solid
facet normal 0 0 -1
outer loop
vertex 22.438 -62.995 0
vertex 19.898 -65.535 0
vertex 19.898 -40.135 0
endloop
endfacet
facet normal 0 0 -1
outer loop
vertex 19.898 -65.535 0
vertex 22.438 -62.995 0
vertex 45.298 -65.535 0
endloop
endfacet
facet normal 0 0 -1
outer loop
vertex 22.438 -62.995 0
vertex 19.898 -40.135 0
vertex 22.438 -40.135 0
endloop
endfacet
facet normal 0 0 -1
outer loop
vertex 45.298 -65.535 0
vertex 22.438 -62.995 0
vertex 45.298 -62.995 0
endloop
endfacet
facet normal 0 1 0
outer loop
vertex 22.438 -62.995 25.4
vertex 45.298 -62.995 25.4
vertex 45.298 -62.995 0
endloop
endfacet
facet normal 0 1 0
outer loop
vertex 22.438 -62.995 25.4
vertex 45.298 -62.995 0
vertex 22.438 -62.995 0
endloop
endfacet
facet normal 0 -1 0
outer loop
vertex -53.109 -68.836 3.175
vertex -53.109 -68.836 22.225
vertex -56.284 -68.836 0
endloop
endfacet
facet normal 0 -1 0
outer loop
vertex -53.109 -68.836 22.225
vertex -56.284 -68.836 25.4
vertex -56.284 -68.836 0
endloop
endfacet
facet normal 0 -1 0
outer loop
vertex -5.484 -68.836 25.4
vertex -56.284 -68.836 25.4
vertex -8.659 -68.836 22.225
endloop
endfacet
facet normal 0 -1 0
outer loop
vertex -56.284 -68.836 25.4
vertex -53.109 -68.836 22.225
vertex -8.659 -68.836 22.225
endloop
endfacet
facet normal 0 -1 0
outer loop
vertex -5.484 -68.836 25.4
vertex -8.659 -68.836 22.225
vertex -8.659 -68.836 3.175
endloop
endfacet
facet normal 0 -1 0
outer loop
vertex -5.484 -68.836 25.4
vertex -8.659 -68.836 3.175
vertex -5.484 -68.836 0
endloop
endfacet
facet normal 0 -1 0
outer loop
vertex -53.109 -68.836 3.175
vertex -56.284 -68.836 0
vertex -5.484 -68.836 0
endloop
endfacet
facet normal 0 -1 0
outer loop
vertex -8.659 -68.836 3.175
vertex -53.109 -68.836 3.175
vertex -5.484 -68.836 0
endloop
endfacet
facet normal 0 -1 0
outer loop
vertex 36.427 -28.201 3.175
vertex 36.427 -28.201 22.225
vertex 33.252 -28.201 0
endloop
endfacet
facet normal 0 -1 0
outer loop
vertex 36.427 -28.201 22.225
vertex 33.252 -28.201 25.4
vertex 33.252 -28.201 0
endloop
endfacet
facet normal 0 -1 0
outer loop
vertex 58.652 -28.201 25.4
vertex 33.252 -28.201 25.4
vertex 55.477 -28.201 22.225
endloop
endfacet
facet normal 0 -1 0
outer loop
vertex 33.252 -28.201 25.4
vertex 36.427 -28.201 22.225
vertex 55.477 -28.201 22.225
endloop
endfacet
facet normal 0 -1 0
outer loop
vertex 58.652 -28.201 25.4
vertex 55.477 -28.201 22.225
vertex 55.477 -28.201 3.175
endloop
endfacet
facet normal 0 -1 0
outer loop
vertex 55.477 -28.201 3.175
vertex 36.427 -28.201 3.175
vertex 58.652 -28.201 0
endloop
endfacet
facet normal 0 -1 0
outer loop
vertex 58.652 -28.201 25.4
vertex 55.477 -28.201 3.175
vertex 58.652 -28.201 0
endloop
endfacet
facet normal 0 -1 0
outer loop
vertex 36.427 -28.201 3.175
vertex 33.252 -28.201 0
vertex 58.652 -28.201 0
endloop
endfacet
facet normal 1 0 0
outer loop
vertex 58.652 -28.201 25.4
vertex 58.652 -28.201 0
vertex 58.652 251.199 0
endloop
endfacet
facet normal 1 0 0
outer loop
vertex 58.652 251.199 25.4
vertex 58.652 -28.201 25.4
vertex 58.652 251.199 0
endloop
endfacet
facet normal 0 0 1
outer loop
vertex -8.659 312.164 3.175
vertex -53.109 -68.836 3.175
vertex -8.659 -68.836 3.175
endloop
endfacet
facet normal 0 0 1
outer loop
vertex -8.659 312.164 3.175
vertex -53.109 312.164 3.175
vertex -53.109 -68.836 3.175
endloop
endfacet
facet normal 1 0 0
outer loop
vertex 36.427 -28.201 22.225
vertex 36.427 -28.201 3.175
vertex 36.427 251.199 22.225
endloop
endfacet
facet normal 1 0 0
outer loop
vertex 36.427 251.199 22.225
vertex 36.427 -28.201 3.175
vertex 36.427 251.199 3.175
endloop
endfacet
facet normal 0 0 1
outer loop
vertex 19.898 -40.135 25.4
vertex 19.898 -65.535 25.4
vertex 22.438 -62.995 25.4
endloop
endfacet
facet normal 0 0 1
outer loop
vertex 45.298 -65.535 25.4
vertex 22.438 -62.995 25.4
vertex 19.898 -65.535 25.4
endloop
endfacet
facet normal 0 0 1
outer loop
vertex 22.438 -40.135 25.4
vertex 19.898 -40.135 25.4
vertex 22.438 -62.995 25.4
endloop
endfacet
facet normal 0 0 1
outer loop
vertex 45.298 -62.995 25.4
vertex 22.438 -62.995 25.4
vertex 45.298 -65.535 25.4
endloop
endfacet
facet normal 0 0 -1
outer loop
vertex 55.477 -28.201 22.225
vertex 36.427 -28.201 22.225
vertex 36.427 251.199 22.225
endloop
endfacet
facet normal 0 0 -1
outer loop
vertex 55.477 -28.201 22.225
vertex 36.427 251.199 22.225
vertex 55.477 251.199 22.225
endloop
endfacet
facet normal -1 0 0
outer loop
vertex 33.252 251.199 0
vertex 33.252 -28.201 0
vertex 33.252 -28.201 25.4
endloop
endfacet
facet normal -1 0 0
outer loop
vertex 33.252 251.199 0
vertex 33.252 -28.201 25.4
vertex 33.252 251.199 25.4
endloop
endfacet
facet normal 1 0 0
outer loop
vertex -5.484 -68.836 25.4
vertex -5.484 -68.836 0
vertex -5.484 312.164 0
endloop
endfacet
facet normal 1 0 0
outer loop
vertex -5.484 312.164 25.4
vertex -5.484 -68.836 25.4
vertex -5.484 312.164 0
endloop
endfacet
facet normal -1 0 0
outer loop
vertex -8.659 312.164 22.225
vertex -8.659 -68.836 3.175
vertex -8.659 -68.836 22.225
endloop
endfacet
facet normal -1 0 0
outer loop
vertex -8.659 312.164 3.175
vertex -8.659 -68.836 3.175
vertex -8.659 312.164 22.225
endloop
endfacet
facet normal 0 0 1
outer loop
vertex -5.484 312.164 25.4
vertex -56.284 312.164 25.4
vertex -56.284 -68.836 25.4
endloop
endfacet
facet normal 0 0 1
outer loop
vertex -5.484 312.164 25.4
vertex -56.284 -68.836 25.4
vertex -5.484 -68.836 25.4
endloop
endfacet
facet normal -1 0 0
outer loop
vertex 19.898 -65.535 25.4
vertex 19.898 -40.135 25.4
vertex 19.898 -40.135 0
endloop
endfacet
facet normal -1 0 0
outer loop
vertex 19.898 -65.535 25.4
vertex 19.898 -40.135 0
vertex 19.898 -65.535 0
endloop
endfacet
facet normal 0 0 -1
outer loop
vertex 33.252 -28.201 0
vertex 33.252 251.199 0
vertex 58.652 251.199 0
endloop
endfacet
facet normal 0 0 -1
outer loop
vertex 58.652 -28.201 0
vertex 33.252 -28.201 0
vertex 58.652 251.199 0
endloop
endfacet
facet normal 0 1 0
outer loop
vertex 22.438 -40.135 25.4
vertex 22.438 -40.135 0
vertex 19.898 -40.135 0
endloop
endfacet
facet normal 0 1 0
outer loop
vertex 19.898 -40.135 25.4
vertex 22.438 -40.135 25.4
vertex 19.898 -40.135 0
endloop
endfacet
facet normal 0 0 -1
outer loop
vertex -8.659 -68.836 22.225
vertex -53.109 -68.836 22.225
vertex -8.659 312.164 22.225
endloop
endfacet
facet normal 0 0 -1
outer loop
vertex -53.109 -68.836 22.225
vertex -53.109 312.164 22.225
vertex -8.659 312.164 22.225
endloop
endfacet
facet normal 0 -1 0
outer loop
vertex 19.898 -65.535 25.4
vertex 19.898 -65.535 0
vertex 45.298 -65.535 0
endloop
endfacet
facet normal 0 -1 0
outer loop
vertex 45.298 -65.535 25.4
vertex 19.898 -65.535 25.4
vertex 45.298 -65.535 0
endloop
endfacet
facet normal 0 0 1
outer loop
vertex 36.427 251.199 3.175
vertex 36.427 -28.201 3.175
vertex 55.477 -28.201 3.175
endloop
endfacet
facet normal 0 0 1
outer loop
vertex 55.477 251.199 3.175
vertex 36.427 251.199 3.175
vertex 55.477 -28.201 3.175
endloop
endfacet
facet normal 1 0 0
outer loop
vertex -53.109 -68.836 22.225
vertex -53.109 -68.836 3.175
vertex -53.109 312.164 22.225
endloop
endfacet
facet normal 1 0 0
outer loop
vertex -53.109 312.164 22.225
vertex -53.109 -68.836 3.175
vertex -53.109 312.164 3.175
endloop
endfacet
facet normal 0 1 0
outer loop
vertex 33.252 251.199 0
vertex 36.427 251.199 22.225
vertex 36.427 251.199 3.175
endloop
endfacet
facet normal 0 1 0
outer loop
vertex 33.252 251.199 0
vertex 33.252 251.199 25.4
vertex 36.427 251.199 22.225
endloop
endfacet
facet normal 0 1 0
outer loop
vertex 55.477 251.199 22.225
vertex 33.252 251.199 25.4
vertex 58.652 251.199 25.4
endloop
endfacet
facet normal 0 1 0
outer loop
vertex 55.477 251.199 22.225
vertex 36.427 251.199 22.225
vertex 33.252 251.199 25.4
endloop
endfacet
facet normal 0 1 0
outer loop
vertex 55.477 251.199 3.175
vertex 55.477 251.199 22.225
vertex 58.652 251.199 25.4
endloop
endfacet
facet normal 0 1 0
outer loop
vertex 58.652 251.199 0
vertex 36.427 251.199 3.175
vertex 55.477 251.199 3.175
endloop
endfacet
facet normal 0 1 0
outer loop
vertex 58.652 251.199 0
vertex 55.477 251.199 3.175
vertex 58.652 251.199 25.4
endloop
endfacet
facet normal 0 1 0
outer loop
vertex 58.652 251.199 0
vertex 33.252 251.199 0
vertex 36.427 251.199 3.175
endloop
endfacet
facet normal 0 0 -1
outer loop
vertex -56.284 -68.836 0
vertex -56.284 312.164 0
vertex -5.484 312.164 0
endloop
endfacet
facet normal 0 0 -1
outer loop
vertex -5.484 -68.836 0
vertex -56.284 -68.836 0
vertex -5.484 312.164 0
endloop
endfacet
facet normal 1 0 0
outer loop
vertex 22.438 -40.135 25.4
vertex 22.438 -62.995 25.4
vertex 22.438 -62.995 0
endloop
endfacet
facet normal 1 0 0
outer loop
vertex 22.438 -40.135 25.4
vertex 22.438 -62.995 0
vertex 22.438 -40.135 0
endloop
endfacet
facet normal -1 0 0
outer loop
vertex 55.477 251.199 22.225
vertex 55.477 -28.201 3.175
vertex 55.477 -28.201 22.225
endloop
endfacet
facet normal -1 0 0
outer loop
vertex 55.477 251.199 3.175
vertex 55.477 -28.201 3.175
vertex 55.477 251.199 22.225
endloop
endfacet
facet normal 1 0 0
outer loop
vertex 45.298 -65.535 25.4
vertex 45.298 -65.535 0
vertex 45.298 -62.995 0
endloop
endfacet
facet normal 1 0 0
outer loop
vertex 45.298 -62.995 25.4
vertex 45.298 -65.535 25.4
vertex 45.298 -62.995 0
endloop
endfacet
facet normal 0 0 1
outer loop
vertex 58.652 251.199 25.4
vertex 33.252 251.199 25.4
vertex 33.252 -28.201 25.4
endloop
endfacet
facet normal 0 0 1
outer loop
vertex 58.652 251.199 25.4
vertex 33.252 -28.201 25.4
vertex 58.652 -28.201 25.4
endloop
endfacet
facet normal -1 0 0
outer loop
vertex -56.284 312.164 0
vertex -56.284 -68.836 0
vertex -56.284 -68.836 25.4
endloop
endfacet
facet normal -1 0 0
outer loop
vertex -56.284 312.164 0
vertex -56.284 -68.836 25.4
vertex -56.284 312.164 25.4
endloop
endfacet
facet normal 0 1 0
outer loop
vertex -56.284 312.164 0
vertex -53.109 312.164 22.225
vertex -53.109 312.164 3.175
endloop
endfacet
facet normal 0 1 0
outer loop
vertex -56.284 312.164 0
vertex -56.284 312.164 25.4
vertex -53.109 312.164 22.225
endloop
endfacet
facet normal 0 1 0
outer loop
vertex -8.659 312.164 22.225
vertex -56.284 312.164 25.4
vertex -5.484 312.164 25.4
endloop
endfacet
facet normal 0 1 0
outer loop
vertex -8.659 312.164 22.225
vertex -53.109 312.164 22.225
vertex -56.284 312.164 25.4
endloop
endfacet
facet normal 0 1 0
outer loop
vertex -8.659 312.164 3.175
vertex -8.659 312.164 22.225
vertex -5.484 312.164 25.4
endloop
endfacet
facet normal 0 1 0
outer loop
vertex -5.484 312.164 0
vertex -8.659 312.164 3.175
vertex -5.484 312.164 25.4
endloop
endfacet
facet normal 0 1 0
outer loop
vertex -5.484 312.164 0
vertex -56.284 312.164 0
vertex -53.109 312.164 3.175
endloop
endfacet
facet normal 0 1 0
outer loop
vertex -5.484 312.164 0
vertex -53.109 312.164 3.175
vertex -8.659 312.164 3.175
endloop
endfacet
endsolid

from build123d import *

# Parameters (mm, degrees)
F0_W     = 50.8
F0_H     = 381
F1_DEPTH = 25.4
F2_T     = -3.175
F3_W     = 25.4
F3_H     = 279.4
F4_DEPTH = 25.4
F5_T     = -3.175
F7_DEPTH = 25.4


with BuildPart() as f1:
    # F0 (on Top) → F1 (new body)
    with BuildSketch(Plane.XY):
        with Locations((-30.883574, 121.664288)):
            Rectangle(F0_W, F0_H)
    extrude(amount=F1_DEPTH)

    # F2
    f2_openings = [f1.faces().sort_by_distance(p)[0] for p in [
        (-30.883574, -68.835712, 12.7),
        (-30.883574, 312.164288, 12.7),
    ]]
    offset(amount=F2_T, openings=f2_openings)


with BuildPart() as f4:
    # F3 (on Top) → F4 (new body)
    with BuildSketch(Plane.XY):
        with Locations((45.951802, 111.498697)):
            Rectangle(F3_W, F3_H)
    extrude(amount=F4_DEPTH)

    # F5
    f5_openings = [f4.faces().sort_by_distance(p)[0] for p in [
        (45.951802, -28.201303, 12.7),
        (45.951802, 251.198697, 12.7),
    ]]
    offset(amount=F5_T, openings=f5_openings)


with BuildPart() as f7:
    # F6 (on Top) → F7 (new body)
    with BuildSketch(Plane.XY):
        Polygon((22.437792, -40.135192), (19.897792, -40.135192), (19.897792, -65.535192), (45.297792, -65.535192), (45.297792, -62.995192), (22.437792, -62.995192), align=None)
    extrude(amount=F7_DEPTH)


solid = Compound([f1.part, f4.part, f7.part])
